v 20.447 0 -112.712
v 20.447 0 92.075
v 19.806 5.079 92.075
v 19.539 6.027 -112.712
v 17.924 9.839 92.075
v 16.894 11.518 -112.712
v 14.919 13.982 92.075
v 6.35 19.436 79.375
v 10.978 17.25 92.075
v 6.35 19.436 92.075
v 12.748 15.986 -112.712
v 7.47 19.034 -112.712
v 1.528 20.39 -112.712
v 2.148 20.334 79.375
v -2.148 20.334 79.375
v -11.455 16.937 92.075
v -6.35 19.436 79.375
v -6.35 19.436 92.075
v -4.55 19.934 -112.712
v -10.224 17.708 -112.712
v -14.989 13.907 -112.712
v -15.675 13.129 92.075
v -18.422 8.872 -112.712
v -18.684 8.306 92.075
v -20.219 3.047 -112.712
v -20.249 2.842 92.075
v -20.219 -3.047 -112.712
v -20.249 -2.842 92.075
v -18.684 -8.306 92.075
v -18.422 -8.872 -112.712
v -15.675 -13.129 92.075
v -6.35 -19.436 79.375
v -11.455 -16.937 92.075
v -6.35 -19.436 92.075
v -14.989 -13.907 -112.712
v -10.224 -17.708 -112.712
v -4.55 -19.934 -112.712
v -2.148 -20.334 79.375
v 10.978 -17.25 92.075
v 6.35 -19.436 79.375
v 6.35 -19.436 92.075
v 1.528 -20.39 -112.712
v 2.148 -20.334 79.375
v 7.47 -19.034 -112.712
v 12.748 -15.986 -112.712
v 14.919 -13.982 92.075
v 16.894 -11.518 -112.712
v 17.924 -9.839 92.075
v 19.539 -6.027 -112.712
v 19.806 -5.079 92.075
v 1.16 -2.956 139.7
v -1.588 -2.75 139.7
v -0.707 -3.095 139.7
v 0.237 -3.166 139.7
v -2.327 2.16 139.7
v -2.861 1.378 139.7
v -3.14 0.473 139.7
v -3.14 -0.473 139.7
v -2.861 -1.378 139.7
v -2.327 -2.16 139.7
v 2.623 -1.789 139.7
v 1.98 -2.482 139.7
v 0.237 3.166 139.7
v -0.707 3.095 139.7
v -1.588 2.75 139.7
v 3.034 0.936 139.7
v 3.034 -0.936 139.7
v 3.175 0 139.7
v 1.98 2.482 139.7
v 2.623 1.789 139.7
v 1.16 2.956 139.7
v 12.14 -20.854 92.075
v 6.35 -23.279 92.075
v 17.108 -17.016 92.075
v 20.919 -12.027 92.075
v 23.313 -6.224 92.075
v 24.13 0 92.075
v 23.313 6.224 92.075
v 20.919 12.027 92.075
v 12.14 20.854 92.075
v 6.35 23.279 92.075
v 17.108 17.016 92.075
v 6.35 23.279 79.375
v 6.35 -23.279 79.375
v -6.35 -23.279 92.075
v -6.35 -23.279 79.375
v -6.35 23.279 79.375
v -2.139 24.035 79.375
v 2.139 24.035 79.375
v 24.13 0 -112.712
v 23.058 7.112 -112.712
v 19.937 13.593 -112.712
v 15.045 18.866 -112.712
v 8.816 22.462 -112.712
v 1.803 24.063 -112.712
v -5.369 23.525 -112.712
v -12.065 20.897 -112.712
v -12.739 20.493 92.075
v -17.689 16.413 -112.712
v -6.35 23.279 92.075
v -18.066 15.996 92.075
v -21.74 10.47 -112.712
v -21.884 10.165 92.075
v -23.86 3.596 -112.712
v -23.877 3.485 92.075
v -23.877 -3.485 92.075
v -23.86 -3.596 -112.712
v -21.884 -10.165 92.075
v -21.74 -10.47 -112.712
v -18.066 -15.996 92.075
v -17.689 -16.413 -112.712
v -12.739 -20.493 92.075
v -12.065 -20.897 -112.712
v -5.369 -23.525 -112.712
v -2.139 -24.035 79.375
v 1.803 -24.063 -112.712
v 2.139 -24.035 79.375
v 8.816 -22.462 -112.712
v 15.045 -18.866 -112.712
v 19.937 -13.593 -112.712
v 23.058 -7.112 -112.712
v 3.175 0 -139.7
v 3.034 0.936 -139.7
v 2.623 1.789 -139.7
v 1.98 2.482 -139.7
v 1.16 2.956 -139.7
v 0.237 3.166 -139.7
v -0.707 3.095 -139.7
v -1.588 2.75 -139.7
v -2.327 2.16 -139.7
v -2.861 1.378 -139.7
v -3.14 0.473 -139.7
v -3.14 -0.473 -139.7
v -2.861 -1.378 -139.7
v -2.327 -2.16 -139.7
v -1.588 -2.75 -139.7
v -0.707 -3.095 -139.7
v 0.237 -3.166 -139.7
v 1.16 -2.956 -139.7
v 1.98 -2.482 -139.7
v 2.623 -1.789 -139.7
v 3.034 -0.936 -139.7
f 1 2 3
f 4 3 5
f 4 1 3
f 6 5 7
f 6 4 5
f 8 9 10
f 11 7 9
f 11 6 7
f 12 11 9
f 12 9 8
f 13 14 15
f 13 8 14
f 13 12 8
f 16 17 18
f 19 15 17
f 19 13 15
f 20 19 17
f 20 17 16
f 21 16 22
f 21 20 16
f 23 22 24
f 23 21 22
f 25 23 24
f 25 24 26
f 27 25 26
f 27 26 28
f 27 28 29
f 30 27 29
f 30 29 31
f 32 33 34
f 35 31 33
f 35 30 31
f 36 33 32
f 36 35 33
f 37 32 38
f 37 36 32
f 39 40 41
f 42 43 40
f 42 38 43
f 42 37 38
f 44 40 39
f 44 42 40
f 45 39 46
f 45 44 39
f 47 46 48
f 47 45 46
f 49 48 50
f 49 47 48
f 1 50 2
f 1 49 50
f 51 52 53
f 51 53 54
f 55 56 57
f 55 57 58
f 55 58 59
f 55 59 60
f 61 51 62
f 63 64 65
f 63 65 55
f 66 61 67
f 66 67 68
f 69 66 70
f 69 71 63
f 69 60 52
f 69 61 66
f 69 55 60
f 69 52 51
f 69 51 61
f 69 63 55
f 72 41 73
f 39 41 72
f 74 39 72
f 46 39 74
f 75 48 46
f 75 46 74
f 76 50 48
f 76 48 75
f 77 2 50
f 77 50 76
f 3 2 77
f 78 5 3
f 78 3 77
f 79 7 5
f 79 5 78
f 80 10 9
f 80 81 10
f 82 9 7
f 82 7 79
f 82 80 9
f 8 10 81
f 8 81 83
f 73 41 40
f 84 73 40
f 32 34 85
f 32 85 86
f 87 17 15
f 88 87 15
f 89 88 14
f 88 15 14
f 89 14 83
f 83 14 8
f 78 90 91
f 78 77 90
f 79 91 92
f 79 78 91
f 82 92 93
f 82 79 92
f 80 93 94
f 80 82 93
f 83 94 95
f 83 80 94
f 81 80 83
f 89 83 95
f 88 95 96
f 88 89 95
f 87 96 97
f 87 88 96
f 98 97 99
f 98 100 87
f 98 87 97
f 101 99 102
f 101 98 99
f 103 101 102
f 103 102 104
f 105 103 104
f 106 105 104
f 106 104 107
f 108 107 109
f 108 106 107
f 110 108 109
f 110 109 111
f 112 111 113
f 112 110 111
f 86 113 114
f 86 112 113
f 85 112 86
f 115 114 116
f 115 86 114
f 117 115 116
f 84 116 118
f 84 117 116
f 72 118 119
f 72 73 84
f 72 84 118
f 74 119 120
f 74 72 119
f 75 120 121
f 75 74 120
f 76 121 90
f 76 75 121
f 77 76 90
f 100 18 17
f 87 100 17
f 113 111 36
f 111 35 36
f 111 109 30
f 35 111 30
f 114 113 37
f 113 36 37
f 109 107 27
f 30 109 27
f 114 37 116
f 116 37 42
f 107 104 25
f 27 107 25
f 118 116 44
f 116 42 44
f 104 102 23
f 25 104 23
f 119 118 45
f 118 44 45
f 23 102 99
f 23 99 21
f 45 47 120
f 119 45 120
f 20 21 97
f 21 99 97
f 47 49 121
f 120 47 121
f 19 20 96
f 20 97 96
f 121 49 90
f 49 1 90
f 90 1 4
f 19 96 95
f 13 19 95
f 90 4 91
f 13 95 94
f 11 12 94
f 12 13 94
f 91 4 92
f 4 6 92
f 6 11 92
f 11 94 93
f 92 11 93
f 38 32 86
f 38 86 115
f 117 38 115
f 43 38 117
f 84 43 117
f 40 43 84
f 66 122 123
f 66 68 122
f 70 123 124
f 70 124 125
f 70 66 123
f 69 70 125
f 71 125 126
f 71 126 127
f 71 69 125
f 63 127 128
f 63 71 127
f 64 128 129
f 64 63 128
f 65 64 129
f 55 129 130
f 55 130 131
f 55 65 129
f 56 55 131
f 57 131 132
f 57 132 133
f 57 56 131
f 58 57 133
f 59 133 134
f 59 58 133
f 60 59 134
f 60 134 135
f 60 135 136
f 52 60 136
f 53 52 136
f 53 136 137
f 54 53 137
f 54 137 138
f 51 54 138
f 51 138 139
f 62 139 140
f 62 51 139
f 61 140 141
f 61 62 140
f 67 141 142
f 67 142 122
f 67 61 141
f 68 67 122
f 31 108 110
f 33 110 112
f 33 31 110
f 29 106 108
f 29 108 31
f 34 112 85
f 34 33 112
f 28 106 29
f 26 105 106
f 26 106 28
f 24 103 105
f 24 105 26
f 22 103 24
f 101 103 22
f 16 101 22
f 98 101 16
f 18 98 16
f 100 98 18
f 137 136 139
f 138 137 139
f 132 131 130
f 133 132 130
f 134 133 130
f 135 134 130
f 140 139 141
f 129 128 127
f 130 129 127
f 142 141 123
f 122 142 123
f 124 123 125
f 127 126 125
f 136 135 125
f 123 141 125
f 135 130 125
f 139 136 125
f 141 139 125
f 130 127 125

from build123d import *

# Parameters (mm, degrees)
SKETCH1_R                = 3.175
BOSS_EXTRUDE1_DEPTH      = 139.7
SKETCH2_R                = 24.13
SKETCH2_R_2              = 20.447
BOSS_EXTRUDE2_DEPTH      = 92.075
BOSS_EXTRUDE2_DEPTH_BACK = 112.7125
CUT_EXTRUDE1_START       = 19.43598
SKETCH3_W                = 12.7
SKETCH3_H                = 12.7
CUT_EXTRUDE1_DEPTH       = 4.69402


with BuildPart() as part:
    # Sketch1 → Boss-Extrude1 (new body, symmetric)
    with BuildSketch(Plane.XY):
        Circle(SKETCH1_R)
    extrude(amount=BOSS_EXTRUDE1_DEPTH, both=True)


with BuildPart() as body_2:
    # Sketch2 → Boss-Extrude2 (new body, two sides)
    with BuildSketch(Plane.XY) as boss_extrude2_sk:
        Circle(SKETCH2_R)
        Circle(SKETCH2_R_2, mode=Mode.SUBTRACT)
    extrude(amount=BOSS_EXTRUDE2_DEPTH)
    extrude(boss_extrude2_sk.sketch, amount=-BOSS_EXTRUDE2_DEPTH_BACK)

    # Sketch3 → Cut-Extrude1 (cut)
    with BuildSketch(Plane(origin=(0, 0, 0), x_dir=(1, 0, 0), z_dir=(0, 1, 0)).offset(CUT_EXTRUDE1_START)):
        with Locations((0, -85.725)):
            Rectangle(SKETCH3_W, SKETCH3_H)
    cut_extrude1 = extrude(amount=CUT_EXTRUDE1_DEPTH, mode=Mode.SUBTRACT)

    # Mirror1: Cut-Extrude1 across plane
    add(cut_extrude1.mirror(Plane.ZX), mode=Mode.SUBTRACT)


solid = Compound([part.part, body_2.part])
